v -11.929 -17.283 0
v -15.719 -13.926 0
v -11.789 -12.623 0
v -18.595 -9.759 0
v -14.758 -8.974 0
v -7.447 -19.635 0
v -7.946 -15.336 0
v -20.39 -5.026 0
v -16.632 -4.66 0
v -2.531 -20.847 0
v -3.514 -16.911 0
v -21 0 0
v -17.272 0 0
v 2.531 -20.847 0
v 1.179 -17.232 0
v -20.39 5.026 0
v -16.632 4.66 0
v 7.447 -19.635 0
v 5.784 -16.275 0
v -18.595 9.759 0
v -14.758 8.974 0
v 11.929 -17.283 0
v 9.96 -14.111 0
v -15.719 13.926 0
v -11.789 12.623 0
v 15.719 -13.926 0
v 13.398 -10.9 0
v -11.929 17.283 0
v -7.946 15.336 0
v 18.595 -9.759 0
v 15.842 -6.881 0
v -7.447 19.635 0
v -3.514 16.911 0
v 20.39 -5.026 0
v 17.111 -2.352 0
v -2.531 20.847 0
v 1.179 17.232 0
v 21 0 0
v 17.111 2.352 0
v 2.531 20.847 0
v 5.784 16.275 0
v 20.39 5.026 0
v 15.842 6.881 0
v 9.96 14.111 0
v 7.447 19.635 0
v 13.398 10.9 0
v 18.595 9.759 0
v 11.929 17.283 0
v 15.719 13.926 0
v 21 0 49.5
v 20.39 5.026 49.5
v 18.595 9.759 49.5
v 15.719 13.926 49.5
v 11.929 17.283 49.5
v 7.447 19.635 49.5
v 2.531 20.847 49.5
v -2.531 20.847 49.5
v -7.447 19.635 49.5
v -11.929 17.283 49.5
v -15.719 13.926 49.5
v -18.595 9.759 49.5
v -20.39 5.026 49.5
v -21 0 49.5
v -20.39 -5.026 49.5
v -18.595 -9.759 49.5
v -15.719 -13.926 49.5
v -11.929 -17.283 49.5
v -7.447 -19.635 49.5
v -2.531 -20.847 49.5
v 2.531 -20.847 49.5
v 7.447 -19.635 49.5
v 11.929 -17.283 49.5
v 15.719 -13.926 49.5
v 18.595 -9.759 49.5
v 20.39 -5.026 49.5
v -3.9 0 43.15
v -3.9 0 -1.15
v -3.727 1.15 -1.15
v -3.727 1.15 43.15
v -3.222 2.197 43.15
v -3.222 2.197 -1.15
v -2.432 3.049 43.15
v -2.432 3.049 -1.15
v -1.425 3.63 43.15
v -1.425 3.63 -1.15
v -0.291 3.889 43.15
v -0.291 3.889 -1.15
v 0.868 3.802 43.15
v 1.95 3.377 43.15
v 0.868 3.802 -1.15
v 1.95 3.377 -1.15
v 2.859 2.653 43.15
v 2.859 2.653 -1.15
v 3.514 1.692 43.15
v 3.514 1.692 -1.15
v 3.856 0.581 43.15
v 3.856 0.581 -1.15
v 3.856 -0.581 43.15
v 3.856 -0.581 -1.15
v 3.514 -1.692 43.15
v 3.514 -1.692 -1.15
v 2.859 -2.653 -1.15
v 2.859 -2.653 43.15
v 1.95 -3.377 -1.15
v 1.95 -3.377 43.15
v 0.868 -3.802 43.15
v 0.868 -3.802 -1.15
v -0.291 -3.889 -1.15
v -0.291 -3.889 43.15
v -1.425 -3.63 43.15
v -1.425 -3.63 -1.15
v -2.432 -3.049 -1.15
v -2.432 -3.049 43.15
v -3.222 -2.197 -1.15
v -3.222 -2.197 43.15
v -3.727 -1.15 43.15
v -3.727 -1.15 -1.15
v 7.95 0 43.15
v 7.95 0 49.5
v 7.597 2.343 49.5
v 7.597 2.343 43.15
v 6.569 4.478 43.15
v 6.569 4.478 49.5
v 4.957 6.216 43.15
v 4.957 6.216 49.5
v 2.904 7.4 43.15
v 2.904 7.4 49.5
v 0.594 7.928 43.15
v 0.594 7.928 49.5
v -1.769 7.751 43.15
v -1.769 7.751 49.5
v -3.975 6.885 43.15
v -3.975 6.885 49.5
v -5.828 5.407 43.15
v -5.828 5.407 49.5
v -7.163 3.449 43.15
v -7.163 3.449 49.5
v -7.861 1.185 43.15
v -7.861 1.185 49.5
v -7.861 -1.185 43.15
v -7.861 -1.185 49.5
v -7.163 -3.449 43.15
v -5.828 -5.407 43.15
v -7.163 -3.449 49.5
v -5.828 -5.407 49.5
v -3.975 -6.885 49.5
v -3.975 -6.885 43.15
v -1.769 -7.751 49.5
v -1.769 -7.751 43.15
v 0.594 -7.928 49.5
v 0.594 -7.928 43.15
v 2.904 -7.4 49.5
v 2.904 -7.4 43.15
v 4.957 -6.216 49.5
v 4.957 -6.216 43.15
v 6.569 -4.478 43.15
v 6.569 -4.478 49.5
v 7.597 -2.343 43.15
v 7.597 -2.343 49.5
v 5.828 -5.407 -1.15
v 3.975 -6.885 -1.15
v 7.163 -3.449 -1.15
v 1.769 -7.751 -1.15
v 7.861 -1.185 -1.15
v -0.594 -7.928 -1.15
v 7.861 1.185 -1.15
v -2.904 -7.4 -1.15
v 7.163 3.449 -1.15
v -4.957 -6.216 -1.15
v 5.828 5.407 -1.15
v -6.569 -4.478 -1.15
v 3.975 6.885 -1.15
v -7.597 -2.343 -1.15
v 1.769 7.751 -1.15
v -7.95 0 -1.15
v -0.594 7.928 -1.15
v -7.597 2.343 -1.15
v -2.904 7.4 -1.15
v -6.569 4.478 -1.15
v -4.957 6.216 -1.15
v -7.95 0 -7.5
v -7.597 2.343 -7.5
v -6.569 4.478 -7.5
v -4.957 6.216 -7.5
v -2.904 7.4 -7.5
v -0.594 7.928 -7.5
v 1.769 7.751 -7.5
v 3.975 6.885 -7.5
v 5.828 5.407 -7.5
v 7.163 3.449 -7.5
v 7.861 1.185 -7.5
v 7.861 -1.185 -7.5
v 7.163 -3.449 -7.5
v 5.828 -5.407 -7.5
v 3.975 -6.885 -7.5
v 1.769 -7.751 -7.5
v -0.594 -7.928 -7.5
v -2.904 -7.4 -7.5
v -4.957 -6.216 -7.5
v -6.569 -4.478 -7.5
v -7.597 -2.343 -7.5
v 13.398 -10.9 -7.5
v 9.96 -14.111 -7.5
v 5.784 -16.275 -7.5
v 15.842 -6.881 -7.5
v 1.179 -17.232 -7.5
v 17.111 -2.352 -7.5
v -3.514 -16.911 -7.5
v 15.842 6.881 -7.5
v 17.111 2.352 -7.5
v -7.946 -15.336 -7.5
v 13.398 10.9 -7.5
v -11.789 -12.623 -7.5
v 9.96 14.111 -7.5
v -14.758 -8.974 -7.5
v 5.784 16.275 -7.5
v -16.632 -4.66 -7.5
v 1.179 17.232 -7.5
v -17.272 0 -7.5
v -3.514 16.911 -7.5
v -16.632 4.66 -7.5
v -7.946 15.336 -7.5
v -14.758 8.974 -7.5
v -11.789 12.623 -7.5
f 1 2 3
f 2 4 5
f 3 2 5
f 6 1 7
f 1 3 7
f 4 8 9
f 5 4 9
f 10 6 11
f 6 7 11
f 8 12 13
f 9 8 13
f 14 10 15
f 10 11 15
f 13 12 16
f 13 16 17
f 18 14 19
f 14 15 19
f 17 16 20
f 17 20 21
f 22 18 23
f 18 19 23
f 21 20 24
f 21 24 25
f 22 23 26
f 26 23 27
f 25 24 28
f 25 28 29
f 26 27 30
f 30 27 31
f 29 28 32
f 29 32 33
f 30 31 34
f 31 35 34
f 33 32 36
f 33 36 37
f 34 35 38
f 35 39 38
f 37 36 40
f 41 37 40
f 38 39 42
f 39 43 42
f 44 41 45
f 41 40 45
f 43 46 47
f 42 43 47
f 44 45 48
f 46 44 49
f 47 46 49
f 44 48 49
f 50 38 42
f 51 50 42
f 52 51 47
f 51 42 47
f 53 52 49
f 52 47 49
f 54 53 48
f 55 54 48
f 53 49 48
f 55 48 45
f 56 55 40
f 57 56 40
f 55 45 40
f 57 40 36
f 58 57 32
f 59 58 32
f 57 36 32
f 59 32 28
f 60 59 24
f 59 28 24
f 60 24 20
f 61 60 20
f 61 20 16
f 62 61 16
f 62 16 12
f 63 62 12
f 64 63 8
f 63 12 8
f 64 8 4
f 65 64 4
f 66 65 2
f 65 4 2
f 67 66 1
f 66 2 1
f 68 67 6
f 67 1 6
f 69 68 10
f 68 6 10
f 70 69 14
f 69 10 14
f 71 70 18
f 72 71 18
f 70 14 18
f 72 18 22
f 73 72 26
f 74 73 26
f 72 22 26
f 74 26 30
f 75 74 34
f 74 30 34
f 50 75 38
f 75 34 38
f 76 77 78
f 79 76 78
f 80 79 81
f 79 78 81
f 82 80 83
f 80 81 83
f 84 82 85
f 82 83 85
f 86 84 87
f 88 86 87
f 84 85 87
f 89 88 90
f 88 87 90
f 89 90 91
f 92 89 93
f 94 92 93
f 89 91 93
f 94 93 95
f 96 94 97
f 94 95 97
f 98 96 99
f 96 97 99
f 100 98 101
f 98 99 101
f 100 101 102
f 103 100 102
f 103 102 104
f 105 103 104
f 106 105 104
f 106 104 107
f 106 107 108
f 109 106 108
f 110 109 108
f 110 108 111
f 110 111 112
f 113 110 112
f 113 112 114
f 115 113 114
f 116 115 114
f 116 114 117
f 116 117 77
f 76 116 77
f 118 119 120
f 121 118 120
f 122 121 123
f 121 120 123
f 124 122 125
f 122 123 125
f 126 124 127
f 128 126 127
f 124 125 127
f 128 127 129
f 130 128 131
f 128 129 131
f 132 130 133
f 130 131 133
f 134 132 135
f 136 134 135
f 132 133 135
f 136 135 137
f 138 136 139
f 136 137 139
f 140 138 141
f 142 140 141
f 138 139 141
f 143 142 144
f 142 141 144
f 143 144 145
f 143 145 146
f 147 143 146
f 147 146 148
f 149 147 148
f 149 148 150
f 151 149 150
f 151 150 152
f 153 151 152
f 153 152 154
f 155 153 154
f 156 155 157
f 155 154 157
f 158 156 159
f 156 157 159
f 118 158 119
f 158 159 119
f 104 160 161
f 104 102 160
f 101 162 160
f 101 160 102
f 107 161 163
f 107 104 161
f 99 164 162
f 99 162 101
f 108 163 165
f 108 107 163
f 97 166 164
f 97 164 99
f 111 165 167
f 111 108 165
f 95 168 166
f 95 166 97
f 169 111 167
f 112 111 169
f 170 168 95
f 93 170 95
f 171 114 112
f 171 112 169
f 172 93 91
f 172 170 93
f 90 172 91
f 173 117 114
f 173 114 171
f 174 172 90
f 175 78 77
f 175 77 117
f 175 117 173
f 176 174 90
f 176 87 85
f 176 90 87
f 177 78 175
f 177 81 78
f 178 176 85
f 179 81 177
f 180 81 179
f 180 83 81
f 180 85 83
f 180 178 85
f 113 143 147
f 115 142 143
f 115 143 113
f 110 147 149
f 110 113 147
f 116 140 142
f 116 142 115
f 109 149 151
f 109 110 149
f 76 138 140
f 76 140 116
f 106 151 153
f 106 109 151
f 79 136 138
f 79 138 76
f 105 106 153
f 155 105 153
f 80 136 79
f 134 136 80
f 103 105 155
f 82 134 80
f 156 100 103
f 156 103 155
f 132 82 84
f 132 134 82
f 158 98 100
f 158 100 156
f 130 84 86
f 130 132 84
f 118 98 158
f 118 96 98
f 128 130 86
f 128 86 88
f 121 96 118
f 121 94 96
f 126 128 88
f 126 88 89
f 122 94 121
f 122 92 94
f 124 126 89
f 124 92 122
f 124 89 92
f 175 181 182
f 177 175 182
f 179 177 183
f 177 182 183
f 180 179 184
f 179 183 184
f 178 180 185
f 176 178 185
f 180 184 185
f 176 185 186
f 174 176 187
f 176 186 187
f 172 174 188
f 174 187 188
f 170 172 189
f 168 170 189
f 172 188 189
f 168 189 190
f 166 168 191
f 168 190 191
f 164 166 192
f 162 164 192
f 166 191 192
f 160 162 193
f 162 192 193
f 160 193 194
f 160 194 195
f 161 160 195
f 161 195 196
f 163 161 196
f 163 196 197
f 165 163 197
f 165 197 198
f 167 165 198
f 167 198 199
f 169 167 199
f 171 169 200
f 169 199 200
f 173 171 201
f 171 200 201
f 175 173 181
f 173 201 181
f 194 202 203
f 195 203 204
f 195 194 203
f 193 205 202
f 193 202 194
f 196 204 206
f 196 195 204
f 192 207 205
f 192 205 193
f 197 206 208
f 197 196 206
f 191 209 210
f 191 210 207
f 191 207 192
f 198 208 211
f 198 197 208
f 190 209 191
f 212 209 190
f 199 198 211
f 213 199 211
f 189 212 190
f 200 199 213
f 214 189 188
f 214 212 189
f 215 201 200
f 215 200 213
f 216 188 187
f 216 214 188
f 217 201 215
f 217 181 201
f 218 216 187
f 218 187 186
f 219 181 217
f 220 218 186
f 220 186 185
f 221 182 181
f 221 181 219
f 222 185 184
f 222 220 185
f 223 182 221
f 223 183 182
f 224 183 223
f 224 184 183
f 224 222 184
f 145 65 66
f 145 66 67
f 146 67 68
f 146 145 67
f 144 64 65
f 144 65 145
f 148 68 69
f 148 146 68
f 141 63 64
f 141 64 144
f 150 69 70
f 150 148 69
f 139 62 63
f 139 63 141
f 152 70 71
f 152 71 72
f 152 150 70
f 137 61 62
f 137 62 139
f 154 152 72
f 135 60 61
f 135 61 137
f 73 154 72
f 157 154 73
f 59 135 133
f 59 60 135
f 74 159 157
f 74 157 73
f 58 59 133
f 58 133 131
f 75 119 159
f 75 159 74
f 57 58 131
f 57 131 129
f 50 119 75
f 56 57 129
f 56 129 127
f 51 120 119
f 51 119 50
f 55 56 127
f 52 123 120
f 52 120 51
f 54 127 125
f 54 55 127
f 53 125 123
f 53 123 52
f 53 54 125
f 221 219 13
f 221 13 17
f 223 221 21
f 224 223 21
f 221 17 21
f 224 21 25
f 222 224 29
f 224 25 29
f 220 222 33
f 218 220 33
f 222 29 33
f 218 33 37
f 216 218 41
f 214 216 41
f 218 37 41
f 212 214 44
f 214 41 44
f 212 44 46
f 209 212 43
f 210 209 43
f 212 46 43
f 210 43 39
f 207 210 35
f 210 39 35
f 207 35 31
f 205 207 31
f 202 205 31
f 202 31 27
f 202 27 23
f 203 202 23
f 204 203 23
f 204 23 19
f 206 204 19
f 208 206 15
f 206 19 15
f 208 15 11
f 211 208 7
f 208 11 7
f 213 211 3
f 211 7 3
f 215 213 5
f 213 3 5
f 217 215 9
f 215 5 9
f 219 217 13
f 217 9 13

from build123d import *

# Parameters (mm, degrees)
CROQUIS1_R              = 21
SALIENTE_EXTRUIR1_DEPTH = 49.5
CROQUIS3_R              = 3.9
CORTAR_EXTRUIR1_DEPTH   = 50.5
CROQUIS4_R              = 17.272
SALIENTE_EXTRUIR2_DEPTH = 7.5
CROQUIS5_R              = 3.9
CORTAR_EXTRUIR2_DEPTH   = 7.5
CROQUIS6_R              = 7.95
CORTAR_EXTRUIR3_DEPTH   = 6.35
CROQUIS7_R              = 7.95
CORTAR_EXTRUIR4_DEPTH   = 6.35


with BuildPart() as part:
    # Croquis1 → Saliente-Extruir1 (new body)
    with BuildSketch(Plane.XY):
        Circle(CROQUIS1_R)
    extrude(amount=SALIENTE_EXTRUIR1_DEPTH)

    # Croquis3 → Cortar-Extruir1 (cut, through all)
    with BuildSketch(Plane(origin=(0, 0, 0), x_dir=(-1, 0, 0), z_dir=(0, 0, -1))):
        Circle(CROQUIS3_R)
    extrude(amount=-CORTAR_EXTRUIR1_DEPTH, mode=Mode.SUBTRACT)

    # Croquis4 → Saliente-Extruir2 (add)
    with BuildSketch(Plane(origin=(0, 0, 0), x_dir=(-1, 0, 0), z_dir=(0, 0, -1))):
        Circle(CROQUIS4_R)
    extrude(amount=SALIENTE_EXTRUIR2_DEPTH)

    # Croquis5 → Cortar-Extruir2 (cut)
    with BuildSketch(Plane(origin=(0, 0, -7.5), x_dir=(-1, 0, 0), z_dir=(0, 0, -1))):
        Circle(CROQUIS5_R)
    extrude(amount=-CORTAR_EXTRUIR2_DEPTH, mode=Mode.SUBTRACT)

    # Croquis6 → Cortar-Extruir3 (cut)
    with BuildSketch(Plane(origin=(0, 0, -7.5), x_dir=(-1, 0, 0), z_dir=(0, 0, -1))):
        Circle(CROQUIS6_R)
    extrude(amount=-CORTAR_EXTRUIR3_DEPTH, mode=Mode.SUBTRACT)

    # Croquis7 → Cortar-Extruir4 (cut)
    with BuildSketch(Plane.XY.offset(49.5)):
        Circle(CROQUIS7_R)
    extrude(amount=-CORTAR_EXTRUIR4_DEPTH, mode=Mode.SUBTRACT)


solid = part.part
